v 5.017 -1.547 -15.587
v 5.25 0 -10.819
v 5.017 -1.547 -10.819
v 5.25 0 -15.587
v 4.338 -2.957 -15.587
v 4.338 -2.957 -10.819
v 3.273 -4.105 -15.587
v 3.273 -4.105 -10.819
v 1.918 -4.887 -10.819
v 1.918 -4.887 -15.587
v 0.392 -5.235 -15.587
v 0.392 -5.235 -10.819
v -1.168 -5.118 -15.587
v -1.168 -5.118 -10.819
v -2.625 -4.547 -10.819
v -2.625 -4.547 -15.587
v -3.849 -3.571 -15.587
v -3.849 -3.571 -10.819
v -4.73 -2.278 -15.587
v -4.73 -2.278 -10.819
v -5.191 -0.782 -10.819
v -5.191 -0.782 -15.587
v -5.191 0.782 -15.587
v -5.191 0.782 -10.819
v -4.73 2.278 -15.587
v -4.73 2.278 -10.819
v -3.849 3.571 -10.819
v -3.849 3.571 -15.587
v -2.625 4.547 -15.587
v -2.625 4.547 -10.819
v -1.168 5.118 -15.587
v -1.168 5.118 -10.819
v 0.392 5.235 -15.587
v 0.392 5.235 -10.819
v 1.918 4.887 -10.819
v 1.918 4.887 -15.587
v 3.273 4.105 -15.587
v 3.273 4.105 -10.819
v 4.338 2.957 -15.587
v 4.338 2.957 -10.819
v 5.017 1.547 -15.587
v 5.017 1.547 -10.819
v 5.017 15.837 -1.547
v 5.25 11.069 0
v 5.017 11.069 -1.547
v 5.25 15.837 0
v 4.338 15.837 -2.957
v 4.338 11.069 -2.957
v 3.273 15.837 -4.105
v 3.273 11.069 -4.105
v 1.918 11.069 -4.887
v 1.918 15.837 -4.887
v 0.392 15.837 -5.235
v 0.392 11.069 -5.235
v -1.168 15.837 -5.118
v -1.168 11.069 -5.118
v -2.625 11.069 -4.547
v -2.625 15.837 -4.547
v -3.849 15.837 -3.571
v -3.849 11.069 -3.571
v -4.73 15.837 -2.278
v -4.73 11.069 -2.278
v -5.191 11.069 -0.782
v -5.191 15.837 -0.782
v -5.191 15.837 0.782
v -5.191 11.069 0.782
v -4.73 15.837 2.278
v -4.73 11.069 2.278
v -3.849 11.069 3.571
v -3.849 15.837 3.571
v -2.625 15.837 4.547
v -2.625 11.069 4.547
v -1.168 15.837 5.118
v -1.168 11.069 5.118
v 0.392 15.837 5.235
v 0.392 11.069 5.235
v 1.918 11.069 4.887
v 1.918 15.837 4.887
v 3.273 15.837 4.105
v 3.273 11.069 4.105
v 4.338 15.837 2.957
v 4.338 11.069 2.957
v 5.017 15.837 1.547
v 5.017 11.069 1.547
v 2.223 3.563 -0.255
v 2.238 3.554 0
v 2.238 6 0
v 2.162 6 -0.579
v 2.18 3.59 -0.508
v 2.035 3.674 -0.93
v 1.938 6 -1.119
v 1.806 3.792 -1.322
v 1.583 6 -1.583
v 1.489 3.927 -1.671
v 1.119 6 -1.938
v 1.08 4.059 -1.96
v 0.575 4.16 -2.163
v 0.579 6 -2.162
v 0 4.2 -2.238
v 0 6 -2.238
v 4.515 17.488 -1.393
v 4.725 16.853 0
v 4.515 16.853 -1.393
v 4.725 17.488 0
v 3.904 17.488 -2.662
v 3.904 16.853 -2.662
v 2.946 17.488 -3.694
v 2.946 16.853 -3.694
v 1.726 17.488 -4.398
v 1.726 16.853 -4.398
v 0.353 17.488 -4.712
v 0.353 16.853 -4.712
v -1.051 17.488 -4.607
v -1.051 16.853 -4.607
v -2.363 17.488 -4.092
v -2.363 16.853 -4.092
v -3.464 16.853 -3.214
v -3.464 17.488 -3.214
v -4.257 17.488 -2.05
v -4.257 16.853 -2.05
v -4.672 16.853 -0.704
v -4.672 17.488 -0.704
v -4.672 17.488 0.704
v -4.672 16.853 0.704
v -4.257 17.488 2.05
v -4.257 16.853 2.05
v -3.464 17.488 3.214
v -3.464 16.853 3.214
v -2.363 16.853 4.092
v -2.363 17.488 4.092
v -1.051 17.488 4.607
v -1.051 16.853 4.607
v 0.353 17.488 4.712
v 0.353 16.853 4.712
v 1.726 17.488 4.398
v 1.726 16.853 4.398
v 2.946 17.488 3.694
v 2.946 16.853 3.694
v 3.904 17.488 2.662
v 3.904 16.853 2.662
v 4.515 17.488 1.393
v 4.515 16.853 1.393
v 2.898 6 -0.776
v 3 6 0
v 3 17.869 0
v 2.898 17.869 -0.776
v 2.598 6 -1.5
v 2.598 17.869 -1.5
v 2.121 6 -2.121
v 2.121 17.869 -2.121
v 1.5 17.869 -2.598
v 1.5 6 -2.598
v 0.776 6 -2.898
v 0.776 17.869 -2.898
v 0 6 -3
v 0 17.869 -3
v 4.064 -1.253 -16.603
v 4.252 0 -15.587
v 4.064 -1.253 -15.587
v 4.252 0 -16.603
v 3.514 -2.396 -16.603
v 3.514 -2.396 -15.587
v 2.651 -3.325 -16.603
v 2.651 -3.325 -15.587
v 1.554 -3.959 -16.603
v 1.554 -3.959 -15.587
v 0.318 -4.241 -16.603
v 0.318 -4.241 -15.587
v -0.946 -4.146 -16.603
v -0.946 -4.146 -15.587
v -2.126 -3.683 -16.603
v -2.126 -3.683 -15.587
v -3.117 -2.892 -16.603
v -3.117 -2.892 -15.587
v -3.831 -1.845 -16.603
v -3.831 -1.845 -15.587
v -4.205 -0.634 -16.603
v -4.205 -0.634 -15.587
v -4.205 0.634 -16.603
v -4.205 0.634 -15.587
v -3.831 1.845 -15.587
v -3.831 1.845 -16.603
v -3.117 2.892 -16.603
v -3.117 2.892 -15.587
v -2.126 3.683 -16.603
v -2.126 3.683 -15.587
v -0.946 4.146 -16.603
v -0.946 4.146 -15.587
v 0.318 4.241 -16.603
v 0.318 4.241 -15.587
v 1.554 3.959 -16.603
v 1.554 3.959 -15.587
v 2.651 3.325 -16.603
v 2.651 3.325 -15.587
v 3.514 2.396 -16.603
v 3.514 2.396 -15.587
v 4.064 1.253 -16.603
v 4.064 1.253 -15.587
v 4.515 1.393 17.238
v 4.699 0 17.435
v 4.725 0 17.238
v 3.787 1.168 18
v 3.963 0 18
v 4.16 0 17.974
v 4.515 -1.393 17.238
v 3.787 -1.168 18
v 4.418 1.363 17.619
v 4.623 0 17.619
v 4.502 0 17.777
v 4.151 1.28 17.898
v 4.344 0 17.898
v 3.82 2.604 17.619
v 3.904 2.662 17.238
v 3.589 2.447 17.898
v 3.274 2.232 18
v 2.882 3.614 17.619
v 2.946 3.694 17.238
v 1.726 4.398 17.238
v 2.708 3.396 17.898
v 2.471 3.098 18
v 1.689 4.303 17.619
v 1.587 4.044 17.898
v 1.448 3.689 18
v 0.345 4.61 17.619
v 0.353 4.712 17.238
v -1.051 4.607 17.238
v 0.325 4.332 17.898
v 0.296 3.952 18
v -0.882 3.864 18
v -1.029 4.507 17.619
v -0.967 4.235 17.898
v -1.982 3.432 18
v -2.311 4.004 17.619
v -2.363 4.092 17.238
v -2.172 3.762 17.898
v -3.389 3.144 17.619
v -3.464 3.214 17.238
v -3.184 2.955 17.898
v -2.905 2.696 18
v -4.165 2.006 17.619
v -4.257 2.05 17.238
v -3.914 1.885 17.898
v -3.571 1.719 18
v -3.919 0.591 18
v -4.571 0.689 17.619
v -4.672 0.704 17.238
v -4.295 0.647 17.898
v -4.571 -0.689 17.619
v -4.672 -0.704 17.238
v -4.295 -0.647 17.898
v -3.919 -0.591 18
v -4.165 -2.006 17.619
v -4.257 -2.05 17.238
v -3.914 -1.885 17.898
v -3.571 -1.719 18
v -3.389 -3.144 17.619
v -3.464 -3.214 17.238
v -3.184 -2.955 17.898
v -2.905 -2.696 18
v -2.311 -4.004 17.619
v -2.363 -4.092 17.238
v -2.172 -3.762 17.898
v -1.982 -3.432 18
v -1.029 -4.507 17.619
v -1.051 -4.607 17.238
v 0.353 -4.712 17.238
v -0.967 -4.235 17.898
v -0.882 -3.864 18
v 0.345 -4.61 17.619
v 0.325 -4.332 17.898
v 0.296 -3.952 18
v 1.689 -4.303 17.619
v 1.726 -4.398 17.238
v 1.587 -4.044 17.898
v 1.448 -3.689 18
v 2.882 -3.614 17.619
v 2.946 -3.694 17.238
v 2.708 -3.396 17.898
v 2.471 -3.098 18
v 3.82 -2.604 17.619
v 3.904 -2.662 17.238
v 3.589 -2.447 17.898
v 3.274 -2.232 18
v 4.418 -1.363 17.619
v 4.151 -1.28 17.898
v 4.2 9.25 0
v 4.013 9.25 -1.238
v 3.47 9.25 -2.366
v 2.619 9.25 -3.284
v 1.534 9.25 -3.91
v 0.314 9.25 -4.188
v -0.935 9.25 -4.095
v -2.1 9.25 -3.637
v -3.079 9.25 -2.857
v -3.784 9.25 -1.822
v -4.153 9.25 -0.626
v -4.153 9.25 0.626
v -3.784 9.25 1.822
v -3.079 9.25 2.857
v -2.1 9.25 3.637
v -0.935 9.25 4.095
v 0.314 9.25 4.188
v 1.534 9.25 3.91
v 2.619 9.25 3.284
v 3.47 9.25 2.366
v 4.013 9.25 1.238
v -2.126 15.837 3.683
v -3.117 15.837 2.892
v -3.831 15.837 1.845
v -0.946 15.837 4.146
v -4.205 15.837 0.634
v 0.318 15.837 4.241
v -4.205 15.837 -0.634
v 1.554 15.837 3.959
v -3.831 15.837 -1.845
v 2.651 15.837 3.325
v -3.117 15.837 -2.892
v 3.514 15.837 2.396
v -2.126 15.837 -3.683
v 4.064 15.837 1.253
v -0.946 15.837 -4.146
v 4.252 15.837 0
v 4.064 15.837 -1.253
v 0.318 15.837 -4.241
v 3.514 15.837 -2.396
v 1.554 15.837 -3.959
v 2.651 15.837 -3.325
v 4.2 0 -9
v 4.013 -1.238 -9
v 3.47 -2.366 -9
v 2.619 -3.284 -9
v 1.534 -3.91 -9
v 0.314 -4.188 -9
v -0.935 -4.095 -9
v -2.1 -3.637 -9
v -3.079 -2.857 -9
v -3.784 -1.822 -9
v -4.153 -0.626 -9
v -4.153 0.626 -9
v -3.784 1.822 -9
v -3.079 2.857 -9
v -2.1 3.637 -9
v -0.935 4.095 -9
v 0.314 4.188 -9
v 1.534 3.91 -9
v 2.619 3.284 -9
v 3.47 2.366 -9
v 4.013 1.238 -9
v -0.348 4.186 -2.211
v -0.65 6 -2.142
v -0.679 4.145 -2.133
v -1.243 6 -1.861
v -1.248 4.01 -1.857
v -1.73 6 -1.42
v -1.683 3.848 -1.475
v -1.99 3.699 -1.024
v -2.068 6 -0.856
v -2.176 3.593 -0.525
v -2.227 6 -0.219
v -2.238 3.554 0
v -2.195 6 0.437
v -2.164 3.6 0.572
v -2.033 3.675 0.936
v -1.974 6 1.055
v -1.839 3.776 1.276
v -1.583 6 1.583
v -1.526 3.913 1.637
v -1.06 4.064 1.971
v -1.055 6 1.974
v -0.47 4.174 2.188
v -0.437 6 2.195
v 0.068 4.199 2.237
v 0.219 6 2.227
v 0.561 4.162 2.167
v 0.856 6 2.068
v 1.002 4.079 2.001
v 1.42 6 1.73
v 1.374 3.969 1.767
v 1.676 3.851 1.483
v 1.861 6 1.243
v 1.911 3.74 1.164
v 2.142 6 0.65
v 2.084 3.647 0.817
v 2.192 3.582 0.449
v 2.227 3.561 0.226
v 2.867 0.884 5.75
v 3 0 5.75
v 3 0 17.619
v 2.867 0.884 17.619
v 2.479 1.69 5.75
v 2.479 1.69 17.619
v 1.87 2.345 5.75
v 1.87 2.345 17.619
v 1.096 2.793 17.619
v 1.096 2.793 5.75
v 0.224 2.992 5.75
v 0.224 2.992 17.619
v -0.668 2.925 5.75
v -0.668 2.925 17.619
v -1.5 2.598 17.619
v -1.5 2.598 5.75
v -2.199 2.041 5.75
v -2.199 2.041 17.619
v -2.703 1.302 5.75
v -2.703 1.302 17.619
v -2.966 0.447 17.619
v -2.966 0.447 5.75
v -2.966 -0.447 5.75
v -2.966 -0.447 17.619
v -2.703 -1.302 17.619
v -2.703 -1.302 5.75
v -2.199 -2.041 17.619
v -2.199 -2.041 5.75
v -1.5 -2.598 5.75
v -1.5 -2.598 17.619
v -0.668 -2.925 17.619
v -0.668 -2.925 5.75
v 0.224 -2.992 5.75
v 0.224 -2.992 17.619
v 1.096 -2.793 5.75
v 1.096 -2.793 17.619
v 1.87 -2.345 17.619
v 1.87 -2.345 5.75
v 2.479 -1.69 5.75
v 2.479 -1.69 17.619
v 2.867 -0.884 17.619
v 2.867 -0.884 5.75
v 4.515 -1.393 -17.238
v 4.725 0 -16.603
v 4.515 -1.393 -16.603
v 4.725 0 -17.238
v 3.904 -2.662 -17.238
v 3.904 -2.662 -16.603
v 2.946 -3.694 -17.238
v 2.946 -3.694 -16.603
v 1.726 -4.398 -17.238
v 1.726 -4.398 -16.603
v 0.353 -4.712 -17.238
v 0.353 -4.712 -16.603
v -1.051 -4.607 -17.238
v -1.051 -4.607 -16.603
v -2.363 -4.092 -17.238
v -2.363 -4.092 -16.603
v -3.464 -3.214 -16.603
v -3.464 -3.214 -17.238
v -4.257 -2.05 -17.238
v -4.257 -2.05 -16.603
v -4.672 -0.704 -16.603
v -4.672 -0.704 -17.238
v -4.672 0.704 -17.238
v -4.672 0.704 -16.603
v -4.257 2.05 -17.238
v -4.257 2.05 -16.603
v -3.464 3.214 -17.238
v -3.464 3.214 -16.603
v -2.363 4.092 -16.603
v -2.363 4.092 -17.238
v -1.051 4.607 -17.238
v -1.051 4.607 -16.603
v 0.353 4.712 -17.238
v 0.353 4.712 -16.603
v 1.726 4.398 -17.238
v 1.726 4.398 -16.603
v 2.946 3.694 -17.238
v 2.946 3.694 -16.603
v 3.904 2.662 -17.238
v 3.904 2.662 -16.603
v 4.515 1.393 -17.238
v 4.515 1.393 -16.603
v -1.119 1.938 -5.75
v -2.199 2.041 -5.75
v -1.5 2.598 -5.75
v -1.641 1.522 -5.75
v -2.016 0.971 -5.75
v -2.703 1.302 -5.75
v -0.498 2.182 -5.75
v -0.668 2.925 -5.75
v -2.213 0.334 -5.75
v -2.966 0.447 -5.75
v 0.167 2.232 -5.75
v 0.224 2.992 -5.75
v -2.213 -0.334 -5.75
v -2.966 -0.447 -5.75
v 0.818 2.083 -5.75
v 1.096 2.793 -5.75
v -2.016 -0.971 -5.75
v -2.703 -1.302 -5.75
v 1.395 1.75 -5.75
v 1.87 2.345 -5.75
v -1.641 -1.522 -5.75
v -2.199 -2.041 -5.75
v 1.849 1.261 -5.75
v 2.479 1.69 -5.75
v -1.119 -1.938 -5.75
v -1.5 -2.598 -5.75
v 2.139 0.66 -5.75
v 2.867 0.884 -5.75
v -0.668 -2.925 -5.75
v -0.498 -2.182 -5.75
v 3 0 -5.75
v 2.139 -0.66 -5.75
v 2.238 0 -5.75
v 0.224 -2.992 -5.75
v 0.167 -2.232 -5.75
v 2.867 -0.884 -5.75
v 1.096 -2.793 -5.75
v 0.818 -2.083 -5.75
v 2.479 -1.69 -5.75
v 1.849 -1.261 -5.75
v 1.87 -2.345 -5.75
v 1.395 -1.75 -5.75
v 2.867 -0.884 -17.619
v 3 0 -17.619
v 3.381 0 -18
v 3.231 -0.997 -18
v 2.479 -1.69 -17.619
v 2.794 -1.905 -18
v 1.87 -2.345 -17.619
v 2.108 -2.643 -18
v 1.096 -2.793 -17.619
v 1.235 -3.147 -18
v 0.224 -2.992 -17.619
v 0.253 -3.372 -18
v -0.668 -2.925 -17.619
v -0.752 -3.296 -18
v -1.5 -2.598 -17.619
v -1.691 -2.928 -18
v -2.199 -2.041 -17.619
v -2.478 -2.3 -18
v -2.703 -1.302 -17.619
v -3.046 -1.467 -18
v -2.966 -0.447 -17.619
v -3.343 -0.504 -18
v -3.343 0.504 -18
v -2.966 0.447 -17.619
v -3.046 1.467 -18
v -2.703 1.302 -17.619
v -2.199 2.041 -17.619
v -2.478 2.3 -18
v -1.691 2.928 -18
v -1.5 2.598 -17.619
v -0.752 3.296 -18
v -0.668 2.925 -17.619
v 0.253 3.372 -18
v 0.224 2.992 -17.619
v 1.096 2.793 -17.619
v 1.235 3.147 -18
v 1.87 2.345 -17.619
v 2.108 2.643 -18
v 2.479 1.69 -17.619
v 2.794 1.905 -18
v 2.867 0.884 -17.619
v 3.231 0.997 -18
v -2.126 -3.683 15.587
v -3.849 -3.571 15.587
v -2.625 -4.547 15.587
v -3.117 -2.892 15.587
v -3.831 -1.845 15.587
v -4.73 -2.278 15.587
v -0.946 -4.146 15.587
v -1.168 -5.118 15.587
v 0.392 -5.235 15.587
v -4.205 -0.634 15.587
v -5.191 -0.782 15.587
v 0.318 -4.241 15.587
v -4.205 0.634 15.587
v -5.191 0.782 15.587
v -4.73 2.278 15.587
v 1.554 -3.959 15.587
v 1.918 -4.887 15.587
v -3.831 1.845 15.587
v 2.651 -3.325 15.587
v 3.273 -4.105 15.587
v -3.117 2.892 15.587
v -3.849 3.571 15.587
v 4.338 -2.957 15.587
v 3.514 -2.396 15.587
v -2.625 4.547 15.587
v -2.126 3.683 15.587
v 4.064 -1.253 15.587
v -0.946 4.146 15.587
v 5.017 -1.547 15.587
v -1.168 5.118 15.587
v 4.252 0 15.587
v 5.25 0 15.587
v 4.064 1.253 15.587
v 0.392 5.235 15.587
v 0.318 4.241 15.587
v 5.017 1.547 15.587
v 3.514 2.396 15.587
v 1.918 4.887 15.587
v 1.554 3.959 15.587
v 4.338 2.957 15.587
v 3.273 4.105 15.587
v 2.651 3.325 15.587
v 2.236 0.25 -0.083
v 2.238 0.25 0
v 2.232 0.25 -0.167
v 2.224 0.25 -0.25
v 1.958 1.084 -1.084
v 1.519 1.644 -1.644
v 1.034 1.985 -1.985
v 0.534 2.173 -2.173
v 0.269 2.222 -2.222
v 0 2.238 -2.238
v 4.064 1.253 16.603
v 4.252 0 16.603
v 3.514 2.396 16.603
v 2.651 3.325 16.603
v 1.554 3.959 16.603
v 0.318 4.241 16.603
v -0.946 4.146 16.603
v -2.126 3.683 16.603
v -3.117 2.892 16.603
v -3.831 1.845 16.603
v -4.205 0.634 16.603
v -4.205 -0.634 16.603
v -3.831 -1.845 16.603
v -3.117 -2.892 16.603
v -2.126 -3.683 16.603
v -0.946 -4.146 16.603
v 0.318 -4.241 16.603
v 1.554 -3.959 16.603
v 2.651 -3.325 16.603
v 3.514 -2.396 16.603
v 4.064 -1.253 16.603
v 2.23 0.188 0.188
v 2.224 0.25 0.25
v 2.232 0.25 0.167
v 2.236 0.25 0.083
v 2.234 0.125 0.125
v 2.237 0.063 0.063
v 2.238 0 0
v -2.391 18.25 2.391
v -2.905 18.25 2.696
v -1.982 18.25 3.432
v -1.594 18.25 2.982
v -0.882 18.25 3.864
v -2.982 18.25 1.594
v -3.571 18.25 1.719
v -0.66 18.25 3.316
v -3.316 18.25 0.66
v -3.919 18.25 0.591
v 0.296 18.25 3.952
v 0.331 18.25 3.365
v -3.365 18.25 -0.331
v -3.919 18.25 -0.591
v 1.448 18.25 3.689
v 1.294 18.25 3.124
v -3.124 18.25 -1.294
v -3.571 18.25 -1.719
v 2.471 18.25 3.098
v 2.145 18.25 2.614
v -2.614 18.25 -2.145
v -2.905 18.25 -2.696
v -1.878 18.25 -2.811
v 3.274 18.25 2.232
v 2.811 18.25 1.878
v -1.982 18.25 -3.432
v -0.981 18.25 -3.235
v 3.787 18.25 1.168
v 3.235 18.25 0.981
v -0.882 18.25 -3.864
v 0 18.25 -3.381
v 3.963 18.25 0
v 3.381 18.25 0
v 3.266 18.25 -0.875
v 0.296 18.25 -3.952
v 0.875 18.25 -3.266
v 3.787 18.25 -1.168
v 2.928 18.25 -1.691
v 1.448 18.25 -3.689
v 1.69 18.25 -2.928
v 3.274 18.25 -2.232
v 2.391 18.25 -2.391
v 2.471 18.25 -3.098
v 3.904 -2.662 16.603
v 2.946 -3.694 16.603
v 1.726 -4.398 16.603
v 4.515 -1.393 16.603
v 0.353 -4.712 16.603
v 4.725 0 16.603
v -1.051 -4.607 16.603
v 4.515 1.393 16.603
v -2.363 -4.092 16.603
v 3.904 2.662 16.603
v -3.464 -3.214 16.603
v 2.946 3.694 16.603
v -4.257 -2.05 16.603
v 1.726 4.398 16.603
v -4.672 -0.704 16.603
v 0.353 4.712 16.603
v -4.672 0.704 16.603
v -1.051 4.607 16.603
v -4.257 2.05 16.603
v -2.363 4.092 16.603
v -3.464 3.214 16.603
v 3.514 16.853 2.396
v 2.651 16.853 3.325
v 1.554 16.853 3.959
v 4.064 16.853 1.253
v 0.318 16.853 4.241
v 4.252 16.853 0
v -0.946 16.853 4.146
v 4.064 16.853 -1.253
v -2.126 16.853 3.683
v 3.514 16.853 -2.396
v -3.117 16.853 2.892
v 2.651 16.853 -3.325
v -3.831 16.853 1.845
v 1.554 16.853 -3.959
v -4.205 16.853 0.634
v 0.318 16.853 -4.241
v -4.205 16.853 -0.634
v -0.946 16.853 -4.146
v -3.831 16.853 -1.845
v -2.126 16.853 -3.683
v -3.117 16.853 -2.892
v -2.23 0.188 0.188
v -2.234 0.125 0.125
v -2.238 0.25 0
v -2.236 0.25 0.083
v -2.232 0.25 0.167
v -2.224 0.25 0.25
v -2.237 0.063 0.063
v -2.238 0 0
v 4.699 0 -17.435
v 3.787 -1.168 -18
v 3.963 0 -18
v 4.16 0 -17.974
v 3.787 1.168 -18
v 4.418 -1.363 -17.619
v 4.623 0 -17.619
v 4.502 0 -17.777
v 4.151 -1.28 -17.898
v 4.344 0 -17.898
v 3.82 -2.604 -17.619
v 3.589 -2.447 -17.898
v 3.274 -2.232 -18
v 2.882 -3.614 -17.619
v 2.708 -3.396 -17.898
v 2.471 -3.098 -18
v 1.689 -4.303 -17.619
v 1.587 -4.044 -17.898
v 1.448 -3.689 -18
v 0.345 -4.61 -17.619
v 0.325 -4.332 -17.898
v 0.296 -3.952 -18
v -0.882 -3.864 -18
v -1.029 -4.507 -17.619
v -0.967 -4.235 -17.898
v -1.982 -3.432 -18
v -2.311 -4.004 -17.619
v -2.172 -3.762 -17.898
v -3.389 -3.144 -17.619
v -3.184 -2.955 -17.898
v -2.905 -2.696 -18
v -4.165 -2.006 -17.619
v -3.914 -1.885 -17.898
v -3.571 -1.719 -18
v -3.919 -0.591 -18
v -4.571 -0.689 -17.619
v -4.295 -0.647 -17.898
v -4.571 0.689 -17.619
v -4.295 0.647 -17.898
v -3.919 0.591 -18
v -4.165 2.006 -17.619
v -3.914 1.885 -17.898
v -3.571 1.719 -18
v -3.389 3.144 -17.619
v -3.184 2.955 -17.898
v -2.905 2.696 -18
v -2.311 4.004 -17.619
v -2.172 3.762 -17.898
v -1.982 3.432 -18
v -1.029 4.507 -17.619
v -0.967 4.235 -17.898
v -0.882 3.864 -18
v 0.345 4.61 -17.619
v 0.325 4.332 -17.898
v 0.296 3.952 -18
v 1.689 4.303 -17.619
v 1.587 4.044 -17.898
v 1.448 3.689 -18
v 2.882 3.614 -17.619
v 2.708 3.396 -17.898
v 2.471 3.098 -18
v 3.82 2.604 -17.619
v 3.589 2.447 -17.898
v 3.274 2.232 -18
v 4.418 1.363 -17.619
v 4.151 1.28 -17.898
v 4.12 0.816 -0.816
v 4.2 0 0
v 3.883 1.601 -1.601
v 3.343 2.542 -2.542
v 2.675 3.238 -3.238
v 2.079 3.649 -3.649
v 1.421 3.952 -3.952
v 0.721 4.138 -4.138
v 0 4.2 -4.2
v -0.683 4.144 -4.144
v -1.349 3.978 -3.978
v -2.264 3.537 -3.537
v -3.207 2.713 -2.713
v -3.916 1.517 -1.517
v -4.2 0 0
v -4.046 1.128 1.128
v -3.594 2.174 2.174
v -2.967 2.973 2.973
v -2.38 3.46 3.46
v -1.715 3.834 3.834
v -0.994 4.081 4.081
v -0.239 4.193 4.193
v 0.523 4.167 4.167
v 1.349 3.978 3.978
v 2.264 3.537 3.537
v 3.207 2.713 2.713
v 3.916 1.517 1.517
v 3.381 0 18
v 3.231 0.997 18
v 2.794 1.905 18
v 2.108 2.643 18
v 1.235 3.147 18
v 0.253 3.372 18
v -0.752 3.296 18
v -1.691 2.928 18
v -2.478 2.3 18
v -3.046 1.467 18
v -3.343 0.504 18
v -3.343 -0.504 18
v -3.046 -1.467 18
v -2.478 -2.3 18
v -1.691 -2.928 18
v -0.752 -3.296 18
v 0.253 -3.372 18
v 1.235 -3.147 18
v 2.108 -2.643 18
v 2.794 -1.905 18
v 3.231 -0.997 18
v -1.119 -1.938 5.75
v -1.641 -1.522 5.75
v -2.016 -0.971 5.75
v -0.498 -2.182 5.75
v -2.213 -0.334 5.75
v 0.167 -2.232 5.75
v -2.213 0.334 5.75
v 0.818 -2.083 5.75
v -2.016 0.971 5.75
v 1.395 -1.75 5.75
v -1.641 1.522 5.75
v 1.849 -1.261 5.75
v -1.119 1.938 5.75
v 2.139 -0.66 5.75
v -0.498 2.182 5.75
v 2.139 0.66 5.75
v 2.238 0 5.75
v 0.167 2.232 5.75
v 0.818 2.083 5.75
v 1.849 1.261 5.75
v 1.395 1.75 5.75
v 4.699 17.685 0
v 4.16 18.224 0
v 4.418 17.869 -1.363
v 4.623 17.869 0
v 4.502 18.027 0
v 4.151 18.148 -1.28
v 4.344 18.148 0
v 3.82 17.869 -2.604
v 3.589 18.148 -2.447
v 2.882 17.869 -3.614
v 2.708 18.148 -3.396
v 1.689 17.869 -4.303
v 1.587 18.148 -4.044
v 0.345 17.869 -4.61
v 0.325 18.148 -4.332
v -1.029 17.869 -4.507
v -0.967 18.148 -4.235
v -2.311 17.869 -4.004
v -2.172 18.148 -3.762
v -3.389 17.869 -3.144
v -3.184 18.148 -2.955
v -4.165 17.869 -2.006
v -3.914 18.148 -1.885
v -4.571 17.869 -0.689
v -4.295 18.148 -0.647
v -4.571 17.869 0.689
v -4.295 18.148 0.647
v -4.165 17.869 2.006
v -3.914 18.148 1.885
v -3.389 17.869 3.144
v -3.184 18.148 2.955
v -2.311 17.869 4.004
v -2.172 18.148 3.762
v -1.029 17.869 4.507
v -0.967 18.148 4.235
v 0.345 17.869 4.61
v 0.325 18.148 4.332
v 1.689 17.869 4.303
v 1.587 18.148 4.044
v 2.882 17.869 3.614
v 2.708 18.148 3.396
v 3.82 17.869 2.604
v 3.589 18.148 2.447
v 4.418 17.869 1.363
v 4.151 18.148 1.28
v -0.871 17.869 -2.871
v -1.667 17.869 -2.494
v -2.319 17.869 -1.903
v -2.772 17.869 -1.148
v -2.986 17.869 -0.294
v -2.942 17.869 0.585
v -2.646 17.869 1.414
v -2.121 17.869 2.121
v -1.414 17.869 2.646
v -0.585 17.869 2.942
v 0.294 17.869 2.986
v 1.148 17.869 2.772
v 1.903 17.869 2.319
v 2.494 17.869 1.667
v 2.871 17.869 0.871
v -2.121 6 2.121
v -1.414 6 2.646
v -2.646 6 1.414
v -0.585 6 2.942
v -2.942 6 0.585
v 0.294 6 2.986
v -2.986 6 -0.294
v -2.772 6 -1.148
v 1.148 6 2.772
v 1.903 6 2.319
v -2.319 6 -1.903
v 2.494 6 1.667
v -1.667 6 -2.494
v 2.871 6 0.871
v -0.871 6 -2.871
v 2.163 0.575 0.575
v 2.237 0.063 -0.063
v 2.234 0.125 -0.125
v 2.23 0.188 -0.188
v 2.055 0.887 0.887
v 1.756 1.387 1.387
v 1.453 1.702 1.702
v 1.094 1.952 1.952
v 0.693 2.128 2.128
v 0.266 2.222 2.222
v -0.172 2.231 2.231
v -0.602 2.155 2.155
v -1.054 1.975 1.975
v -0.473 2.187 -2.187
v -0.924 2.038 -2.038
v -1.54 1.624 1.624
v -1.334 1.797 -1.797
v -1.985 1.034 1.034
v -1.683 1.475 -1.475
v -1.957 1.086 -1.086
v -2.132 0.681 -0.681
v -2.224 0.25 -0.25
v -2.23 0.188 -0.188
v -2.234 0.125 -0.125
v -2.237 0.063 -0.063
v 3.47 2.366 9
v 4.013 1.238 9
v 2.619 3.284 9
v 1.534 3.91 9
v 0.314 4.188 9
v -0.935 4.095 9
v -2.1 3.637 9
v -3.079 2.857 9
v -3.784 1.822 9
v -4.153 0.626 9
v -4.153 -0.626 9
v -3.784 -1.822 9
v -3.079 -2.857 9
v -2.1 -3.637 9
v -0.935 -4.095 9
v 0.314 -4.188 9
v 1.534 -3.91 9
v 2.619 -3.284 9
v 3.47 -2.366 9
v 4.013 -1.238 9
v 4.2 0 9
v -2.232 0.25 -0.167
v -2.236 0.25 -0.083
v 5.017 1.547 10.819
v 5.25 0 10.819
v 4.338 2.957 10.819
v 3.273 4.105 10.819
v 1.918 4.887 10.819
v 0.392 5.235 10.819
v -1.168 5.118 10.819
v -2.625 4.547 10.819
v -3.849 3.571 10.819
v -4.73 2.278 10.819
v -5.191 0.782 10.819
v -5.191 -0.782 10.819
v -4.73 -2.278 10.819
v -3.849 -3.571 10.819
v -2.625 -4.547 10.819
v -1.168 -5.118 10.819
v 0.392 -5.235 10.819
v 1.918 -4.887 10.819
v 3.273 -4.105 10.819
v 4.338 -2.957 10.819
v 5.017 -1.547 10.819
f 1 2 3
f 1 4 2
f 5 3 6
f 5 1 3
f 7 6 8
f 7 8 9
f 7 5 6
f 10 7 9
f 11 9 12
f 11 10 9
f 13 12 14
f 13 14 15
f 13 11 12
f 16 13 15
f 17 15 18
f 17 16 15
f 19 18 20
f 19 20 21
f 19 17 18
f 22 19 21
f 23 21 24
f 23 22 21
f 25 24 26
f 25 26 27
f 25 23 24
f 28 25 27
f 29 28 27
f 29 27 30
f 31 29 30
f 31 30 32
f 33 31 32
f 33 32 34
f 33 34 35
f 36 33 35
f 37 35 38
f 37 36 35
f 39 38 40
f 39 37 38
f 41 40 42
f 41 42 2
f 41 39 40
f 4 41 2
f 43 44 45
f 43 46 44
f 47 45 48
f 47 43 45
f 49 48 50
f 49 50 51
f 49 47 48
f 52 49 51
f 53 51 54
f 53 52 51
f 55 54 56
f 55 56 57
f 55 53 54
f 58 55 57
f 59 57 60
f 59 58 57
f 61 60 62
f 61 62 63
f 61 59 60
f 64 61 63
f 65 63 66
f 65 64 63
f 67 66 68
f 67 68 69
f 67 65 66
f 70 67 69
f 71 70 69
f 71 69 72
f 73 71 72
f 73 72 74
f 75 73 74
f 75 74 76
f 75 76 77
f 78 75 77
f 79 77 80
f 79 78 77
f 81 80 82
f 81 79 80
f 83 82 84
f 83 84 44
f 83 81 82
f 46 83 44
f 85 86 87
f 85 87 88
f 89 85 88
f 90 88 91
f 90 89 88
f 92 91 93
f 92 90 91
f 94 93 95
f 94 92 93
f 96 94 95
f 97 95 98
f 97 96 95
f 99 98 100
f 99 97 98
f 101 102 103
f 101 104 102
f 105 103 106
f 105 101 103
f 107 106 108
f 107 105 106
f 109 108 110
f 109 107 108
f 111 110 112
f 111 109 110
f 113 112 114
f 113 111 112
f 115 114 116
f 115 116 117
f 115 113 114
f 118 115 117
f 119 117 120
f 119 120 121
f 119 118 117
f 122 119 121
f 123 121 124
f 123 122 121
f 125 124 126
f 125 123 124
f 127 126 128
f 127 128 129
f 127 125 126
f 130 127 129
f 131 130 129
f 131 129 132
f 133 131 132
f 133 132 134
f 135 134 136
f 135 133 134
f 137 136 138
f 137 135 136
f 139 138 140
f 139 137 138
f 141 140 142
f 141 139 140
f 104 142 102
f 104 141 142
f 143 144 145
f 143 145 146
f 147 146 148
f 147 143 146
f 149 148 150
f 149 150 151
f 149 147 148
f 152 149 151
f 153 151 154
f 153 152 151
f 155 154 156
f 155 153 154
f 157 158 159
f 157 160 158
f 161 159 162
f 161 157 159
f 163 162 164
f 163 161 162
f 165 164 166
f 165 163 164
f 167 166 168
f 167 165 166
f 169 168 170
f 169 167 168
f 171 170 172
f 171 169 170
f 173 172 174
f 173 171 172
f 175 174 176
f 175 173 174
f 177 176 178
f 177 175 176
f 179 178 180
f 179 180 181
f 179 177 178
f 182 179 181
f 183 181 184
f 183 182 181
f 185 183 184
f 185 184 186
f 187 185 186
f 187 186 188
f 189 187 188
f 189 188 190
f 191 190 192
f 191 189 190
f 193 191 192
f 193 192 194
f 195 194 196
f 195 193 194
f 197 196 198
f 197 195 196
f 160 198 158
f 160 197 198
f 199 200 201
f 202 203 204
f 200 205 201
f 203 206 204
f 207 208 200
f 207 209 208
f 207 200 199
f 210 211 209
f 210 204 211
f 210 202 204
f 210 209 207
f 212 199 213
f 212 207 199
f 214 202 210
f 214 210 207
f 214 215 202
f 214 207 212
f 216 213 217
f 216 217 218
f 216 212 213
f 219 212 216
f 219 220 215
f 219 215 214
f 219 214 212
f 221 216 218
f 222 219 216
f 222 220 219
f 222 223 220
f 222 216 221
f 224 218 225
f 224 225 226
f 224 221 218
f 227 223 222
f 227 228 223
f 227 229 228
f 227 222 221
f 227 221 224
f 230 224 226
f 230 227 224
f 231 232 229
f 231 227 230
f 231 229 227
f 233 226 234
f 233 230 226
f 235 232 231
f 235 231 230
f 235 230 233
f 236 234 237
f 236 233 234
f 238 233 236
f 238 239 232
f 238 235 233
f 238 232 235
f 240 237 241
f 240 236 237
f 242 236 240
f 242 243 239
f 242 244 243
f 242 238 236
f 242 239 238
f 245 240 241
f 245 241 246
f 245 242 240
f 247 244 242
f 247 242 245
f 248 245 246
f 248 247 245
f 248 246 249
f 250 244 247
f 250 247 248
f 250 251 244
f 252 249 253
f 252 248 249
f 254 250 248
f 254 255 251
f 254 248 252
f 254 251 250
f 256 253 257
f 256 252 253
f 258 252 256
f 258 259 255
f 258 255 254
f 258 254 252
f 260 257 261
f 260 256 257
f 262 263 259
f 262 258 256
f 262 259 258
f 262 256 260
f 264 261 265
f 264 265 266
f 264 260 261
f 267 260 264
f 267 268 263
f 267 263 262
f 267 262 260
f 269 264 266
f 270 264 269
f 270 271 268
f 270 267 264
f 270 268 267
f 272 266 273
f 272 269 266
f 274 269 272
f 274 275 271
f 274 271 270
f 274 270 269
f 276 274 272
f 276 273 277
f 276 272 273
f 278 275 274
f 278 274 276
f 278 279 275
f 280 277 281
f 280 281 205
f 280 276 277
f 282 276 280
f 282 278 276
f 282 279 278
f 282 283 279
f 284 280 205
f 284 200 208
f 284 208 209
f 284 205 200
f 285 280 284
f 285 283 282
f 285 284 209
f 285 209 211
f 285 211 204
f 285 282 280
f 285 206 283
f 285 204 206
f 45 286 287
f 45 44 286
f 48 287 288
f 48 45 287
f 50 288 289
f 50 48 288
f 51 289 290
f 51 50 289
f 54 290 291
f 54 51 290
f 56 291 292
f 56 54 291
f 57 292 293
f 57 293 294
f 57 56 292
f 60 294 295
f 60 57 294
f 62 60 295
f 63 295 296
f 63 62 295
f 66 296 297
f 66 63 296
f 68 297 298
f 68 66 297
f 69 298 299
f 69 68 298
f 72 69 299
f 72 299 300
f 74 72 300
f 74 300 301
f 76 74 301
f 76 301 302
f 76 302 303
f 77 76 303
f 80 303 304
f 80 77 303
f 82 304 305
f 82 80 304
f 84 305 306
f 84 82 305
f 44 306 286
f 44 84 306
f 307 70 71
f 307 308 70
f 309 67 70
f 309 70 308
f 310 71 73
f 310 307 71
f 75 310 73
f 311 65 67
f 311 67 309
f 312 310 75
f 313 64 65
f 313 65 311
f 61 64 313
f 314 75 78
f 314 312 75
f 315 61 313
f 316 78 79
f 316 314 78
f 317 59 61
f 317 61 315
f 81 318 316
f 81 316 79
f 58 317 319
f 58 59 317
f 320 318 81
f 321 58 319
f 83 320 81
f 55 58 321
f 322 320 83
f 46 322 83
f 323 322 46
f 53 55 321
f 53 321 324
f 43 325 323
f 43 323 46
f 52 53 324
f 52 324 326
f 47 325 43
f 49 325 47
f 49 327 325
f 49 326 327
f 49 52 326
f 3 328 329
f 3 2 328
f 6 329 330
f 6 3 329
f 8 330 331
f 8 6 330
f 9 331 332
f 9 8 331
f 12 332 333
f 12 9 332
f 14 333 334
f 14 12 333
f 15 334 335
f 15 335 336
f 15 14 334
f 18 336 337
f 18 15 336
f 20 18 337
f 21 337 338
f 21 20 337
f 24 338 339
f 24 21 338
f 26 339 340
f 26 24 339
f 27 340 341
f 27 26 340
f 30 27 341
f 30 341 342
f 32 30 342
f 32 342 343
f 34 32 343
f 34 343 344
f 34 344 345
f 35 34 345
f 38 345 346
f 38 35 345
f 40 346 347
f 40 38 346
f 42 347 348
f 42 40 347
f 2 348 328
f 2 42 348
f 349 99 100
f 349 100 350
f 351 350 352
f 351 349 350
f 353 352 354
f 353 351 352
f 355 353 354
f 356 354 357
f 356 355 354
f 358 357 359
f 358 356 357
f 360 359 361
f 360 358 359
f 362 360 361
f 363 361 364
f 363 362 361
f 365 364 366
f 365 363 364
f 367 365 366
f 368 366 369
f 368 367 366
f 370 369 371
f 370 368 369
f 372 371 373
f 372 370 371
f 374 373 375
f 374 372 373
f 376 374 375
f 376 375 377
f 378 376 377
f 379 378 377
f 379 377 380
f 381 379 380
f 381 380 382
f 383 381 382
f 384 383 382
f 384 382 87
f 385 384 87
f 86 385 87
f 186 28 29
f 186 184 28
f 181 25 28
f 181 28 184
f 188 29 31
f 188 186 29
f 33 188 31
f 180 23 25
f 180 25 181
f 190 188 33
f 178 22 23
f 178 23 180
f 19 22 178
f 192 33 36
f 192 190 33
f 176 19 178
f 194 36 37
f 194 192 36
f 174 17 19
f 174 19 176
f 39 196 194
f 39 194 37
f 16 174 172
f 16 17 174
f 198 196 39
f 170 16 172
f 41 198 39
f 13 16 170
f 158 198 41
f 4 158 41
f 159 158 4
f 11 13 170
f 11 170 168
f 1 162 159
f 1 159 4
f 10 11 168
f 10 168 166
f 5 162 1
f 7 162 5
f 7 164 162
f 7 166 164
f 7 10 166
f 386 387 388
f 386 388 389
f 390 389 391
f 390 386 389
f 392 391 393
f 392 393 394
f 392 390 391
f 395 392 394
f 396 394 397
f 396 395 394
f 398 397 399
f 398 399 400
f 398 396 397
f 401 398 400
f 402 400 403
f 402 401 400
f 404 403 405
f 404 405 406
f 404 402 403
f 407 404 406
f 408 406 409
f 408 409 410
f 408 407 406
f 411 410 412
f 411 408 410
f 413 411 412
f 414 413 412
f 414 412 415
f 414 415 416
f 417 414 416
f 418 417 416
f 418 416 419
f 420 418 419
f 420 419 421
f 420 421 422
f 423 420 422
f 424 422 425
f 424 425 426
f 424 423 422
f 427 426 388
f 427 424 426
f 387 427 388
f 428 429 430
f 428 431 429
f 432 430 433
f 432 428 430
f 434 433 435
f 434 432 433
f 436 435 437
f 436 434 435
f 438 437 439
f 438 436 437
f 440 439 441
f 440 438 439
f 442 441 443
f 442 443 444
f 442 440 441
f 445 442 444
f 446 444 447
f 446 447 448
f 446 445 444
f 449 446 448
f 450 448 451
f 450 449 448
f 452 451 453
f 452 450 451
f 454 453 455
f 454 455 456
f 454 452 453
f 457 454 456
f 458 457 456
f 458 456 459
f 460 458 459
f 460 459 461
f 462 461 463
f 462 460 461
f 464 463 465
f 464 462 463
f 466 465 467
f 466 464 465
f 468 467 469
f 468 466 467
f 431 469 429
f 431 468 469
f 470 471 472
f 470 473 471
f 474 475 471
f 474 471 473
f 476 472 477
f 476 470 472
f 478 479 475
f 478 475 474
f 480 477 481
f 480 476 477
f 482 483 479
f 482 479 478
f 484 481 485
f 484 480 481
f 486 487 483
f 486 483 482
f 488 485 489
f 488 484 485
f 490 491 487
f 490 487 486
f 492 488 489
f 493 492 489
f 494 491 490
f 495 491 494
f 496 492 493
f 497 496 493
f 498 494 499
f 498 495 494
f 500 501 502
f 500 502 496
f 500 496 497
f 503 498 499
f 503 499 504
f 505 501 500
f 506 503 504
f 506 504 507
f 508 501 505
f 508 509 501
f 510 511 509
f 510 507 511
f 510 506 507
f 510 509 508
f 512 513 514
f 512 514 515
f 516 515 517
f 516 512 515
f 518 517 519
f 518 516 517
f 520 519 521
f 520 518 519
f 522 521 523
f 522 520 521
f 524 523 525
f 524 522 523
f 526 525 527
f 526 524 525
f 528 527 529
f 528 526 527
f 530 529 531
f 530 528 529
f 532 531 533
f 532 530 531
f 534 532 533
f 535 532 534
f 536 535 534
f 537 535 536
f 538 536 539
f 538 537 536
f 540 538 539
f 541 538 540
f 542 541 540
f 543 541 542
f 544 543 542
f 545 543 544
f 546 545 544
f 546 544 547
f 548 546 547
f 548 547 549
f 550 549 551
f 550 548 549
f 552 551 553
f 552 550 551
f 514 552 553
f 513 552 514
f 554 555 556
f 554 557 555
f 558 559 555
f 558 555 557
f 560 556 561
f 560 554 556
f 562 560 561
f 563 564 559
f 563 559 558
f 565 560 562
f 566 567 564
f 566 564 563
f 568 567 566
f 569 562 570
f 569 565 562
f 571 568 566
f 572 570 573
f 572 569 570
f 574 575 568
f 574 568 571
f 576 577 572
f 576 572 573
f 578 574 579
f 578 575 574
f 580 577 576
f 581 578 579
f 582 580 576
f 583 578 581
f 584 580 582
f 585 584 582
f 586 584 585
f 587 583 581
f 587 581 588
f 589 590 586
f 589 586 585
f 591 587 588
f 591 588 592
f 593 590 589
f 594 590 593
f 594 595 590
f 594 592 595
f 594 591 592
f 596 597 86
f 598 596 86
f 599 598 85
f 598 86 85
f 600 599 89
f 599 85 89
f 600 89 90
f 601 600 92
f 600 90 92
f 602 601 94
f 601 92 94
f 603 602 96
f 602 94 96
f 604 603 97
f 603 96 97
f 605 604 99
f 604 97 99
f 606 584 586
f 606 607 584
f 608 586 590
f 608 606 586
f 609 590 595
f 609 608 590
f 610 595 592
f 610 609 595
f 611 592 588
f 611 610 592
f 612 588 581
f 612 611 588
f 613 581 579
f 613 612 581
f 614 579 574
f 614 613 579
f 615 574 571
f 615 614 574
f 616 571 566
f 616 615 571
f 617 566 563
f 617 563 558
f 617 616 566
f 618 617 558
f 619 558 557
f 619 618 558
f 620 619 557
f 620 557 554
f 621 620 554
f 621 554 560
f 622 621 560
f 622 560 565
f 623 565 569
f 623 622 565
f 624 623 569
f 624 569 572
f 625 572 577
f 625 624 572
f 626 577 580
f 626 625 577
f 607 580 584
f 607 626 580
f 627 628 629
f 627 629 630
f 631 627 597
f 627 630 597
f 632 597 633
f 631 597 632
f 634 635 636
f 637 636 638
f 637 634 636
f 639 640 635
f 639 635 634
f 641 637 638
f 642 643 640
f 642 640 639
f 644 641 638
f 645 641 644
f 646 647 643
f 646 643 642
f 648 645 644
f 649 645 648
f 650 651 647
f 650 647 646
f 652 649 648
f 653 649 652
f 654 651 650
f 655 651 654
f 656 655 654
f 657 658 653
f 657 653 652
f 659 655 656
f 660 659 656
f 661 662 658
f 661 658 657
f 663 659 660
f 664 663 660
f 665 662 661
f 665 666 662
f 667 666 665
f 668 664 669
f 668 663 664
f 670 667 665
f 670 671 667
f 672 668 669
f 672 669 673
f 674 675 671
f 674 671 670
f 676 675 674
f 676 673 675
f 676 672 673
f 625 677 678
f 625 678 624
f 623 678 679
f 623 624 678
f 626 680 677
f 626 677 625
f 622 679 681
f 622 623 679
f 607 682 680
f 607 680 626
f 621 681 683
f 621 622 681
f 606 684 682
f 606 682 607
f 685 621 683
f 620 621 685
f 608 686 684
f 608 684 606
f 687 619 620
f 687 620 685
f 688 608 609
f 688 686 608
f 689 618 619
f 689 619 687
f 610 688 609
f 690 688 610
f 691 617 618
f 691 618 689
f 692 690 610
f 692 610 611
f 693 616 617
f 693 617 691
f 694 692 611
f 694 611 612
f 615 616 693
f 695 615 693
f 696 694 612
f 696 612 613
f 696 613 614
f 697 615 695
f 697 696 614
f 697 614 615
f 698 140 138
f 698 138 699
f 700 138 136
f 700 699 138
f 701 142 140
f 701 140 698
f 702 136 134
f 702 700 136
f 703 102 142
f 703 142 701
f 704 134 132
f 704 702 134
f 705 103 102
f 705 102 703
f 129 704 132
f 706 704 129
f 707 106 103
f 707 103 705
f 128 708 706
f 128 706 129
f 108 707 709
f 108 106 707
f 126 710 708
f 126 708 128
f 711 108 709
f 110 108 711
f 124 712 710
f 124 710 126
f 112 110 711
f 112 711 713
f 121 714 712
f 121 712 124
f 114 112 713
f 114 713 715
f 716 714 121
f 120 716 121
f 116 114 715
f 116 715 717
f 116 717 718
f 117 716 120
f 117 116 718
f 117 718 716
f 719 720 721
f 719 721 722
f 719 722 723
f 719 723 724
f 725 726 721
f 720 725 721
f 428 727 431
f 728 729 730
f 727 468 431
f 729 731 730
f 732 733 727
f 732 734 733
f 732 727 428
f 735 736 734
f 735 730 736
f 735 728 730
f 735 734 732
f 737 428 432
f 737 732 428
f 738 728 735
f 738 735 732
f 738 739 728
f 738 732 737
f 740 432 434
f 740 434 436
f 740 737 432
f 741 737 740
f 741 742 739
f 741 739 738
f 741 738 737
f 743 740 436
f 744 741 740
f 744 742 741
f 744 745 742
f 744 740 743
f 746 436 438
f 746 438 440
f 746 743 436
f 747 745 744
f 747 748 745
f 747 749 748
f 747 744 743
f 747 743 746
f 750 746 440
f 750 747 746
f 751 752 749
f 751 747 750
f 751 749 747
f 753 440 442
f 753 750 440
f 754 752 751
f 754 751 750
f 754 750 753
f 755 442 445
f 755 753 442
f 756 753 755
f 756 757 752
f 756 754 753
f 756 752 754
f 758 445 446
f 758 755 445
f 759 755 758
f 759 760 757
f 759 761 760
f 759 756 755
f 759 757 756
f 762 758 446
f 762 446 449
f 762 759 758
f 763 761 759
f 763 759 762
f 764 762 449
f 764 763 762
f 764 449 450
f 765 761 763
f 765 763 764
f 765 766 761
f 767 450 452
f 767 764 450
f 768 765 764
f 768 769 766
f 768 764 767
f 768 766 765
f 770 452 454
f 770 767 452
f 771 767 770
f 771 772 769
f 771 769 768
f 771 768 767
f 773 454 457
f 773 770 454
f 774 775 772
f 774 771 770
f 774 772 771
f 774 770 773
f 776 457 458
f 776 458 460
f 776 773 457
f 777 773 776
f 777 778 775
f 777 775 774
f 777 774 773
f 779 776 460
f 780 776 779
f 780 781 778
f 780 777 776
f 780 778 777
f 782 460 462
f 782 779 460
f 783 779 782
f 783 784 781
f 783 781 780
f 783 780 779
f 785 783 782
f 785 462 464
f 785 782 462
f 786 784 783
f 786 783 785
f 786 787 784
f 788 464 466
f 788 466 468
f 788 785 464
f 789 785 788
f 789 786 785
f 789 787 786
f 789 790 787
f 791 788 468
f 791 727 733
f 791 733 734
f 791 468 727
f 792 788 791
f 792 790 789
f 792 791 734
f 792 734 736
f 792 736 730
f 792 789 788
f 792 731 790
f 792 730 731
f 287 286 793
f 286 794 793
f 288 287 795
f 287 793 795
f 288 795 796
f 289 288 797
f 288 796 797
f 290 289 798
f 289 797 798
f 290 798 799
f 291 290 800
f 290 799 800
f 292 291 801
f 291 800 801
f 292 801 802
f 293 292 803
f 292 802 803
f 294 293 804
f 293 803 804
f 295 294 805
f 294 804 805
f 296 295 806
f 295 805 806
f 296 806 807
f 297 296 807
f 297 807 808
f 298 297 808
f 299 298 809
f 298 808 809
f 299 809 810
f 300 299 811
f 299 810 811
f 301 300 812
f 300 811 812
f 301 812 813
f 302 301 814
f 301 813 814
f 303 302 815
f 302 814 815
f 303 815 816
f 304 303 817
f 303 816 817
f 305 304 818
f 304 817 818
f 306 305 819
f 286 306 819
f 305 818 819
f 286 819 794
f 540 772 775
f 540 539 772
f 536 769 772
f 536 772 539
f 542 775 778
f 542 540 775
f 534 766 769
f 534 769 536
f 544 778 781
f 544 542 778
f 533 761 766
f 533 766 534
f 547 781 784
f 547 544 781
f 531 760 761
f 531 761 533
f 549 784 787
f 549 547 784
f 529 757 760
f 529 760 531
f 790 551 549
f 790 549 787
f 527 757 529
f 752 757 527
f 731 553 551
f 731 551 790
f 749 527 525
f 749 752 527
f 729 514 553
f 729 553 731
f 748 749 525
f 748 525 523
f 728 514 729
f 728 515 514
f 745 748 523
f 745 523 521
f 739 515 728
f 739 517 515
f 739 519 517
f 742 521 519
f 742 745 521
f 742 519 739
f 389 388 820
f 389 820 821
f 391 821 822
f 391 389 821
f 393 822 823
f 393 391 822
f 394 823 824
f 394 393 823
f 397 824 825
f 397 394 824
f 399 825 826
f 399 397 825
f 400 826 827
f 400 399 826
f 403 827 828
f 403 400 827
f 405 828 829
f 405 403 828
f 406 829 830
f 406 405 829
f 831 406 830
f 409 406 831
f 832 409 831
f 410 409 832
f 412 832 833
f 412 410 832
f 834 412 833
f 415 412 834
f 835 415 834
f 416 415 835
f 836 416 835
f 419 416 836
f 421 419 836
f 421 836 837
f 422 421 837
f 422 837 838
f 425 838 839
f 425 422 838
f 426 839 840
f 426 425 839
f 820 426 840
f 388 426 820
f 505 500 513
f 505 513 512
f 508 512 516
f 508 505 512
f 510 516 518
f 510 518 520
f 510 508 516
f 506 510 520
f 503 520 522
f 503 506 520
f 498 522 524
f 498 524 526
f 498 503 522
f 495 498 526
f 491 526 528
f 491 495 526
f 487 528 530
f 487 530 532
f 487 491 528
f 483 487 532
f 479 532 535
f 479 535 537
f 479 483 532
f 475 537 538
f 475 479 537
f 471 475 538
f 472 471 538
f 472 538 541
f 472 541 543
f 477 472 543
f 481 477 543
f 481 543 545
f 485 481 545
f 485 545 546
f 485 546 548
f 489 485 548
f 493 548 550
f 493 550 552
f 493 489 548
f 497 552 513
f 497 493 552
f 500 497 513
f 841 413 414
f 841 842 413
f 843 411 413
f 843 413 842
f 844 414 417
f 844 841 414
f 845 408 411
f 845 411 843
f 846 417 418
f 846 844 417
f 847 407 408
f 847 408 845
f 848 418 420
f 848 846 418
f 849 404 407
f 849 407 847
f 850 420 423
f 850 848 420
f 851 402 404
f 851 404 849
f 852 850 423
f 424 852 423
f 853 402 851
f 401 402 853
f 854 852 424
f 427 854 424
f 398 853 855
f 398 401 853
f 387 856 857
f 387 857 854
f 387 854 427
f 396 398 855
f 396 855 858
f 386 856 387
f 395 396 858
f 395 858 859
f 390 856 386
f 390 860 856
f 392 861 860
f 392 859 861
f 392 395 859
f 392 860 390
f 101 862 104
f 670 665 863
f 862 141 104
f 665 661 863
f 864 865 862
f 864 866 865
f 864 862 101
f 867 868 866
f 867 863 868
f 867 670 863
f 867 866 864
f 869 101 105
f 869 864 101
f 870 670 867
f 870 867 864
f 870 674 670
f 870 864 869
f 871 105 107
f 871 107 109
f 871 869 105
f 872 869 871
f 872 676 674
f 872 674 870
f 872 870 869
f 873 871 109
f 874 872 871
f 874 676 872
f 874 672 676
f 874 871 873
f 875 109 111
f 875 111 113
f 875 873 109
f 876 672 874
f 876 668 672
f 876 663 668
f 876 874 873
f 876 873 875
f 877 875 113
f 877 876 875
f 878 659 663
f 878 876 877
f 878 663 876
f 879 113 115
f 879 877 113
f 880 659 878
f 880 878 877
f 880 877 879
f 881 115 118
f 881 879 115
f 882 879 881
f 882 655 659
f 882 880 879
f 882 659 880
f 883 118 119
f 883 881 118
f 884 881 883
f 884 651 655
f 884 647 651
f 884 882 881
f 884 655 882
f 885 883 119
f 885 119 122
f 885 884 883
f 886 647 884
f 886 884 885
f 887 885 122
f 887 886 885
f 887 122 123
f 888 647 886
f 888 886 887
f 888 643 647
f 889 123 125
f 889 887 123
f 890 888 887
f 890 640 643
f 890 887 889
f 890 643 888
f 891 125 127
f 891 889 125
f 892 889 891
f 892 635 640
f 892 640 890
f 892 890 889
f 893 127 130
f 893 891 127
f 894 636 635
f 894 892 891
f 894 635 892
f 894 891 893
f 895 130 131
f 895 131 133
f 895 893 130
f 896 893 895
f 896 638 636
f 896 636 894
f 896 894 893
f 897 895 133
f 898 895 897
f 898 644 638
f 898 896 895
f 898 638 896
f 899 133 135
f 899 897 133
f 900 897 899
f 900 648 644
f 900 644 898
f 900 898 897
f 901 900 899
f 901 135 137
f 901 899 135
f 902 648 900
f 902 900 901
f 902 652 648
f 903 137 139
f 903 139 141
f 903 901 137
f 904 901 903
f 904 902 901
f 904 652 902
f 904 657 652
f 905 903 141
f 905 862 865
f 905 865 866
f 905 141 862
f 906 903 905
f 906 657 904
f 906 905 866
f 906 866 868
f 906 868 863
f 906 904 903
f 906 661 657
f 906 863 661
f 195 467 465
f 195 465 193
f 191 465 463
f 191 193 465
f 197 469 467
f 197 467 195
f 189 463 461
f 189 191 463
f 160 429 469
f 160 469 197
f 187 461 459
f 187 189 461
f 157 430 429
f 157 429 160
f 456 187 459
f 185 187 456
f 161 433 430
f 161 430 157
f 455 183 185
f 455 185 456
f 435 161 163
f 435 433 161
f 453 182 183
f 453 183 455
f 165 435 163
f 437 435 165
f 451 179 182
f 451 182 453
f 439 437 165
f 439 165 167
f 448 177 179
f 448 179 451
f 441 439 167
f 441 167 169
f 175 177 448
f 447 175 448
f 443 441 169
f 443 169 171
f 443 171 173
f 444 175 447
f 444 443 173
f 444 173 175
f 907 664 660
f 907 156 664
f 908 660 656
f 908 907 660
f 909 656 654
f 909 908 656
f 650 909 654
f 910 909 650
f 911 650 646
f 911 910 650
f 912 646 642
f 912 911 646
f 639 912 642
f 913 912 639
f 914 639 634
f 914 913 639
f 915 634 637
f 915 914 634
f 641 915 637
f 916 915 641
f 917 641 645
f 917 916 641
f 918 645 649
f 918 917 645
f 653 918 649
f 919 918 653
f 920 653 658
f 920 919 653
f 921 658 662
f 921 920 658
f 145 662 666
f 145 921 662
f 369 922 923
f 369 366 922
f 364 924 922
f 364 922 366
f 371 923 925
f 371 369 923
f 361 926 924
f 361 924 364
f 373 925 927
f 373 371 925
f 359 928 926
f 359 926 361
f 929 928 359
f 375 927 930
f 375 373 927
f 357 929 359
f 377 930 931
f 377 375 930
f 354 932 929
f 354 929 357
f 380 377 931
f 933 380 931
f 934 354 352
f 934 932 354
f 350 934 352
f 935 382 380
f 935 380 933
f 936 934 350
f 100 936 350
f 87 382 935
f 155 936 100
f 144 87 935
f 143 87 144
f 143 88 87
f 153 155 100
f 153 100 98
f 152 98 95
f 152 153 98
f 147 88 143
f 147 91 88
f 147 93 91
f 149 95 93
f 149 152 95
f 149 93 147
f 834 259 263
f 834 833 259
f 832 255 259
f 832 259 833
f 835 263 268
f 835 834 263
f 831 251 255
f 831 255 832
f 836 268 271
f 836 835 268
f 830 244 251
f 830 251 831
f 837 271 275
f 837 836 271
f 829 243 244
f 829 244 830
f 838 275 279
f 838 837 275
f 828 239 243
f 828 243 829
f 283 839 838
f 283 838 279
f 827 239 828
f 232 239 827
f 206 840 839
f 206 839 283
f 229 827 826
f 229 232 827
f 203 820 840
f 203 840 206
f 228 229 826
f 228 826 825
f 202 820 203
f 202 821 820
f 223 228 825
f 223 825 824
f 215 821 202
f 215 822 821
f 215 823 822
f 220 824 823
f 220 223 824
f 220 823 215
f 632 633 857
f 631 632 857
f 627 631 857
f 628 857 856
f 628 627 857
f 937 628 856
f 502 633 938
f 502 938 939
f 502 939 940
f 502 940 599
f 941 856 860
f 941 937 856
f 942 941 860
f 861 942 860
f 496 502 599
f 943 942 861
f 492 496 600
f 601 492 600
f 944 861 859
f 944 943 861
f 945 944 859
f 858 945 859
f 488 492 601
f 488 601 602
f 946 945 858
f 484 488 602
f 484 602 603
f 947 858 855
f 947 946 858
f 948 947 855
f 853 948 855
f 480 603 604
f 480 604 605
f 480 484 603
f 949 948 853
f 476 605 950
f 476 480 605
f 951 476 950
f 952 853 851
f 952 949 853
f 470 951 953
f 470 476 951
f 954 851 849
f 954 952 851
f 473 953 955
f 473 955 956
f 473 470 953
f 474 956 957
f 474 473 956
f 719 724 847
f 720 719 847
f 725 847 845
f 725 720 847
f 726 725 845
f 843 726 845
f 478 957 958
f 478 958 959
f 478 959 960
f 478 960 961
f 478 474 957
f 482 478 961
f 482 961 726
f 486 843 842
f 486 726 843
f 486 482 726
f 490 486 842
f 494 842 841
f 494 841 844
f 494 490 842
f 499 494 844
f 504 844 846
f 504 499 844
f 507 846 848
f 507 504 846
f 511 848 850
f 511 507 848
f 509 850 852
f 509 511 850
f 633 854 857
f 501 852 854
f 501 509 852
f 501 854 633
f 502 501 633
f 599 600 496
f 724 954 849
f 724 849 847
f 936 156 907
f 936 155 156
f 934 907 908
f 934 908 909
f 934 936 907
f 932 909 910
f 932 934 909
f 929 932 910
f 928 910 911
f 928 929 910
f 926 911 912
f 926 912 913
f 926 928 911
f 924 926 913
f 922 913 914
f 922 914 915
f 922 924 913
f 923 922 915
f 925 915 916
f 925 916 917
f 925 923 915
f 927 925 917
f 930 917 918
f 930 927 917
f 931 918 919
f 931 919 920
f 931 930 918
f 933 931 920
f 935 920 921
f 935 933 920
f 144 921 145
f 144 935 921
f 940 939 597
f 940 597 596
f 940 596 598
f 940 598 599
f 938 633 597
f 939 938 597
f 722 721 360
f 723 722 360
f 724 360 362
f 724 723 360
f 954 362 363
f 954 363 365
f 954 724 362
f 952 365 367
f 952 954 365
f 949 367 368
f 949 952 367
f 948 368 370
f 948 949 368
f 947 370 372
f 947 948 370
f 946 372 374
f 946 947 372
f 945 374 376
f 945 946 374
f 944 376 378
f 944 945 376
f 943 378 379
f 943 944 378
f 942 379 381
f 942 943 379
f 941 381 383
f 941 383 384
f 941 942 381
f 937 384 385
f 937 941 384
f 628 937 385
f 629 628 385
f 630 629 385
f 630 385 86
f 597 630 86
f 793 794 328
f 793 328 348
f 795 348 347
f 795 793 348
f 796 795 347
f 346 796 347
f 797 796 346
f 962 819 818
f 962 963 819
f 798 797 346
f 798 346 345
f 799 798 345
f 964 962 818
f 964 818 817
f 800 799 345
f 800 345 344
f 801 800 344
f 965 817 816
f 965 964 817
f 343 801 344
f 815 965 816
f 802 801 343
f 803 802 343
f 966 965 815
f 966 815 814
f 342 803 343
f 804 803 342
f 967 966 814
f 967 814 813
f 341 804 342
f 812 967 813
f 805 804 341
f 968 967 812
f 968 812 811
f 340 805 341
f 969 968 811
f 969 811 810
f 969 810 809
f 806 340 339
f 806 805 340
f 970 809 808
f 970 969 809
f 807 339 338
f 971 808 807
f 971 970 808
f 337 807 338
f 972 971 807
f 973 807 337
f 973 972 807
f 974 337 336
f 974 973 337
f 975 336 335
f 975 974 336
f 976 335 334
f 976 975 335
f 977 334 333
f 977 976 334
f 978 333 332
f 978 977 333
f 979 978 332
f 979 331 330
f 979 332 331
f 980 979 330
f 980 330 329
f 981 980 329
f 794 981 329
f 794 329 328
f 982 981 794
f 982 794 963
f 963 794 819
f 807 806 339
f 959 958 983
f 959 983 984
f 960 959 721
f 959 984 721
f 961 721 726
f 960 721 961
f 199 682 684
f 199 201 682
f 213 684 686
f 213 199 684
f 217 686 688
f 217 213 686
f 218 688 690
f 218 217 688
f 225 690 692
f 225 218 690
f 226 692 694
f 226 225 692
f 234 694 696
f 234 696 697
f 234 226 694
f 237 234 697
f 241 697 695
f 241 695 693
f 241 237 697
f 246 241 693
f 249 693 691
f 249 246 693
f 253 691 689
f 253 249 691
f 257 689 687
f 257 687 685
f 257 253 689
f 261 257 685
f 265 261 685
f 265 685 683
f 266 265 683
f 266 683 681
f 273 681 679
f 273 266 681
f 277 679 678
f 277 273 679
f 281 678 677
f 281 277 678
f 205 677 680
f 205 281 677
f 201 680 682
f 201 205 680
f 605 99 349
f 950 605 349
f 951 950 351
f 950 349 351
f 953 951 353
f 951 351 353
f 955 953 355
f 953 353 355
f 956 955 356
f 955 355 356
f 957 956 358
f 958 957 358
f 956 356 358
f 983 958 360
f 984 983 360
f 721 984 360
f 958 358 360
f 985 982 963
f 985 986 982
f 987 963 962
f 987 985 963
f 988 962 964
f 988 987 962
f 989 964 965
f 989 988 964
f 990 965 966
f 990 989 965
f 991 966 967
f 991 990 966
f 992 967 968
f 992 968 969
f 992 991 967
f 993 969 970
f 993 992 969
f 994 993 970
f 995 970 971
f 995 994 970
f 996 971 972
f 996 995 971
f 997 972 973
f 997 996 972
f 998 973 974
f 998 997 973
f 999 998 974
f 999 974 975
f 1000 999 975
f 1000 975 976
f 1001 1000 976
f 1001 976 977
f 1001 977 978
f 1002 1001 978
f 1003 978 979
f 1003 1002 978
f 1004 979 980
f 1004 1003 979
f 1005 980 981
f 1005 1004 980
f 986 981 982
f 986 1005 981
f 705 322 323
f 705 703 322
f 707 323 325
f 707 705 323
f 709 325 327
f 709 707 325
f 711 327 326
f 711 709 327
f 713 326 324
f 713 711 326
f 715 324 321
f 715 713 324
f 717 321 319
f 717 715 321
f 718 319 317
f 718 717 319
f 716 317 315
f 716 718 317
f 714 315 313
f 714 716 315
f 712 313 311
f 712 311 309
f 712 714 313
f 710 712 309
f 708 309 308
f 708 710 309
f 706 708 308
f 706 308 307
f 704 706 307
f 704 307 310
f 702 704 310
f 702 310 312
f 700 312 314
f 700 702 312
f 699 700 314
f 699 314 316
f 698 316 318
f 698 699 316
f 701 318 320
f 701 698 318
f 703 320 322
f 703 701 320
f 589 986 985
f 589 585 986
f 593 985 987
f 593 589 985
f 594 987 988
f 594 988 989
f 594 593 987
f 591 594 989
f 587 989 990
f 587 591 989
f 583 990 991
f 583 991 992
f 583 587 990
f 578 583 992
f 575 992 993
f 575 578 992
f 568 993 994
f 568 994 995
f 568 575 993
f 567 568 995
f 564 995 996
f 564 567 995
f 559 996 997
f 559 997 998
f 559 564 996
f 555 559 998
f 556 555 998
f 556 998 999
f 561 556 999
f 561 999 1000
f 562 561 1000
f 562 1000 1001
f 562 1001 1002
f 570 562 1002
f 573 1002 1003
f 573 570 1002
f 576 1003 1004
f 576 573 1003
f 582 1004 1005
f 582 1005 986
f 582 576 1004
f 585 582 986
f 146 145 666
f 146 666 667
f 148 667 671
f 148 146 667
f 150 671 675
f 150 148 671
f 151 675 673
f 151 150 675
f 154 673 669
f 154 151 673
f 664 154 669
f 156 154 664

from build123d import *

# Parameters (mm, degrees)
CIRPATTERN1_COUNT   = 3
CIRPATTERN1_ANGLE   = 180
SKETCH3_R           = 4.2
BOSS_EXTRUDE1_DEPTH = 0.25
CIRPATTERN2_COUNT   = 2
CIRPATTERN2_ANGLE   = 180


with BuildPart() as part:
    # Sketch1 → Revolve1 (revolve)
    with BuildSketch(Plane(origin=(0, 0, 0), x_dir=(0, 0, -1), z_dir=(1, 0, 0)), mode=Mode.PRIVATE) as revolve1_sk:
        with BuildLine():
            Line((16.603, 4.725), (17.238, 4.725))
            ThreePointArc((17.238, 4.725), (17.776815367, 4.501815367), (18, 3.963))
            Line((18, 3.963), (18, 3.381))
            Line((18, 3.381), (17.619, 3))
            Line((17.619, 3), (5.75, 3))
            Line((5.75, 3), (5.75, 2.238))
            Line((5.75, 2.238), (0, 2.238))
            Line((0, 2.238), (0, 4.2))
            Line((0, 4.2), (9, 4.2))
            Line((9, 4.2), (10.818653348, 5.25))
            Line((10.818653348, 5.25), (15.587, 5.25))
            Line((15.587, 5.25), (15.587, 4.2525))
            Line((15.587, 4.2525), (16.603, 4.2525))
            Line((16.603, 4.2525), (16.603, 4.725))
        make_face()
    revolve(revolve1_sk.sketch.rotate(Axis((0, 0, 0), (0, 0, -1)), 90), axis=Axis((0, 0, 0), (0, 0, -1)))


with BuildPart() as cirpattern1_1:
    # CirPattern1: pattern copy
    add(part.part.rotate(Axis((0, 0, 0), (1, 0, 0)), 1 * CIRPATTERN1_ANGLE / (CIRPATTERN1_COUNT - 1)))


with BuildPart() as cirpattern1_2:
    # CirPattern1: pattern copy
    add(part.part.rotate(Axis((0, 0, 0), (1, 0, 0)), 2 * CIRPATTERN1_ANGLE / (CIRPATTERN1_COUNT - 1)))


with BuildPart() as cirpattern1_1_1:
    # Body-Move/Copy1: moved
    add(cirpattern1_1.part.moved(Location((0, 0.25, 0))))

    # Sketch3 → Boss-Extrude1 (add)
    with BuildSketch(Plane(origin=(0, 0, 0), x_dir=(1, 0, 0), z_dir=(0, 1, 0))):
        Circle(SKETCH3_R)
    extrude(amount=BOSS_EXTRUDE1_DEPTH)


with BuildPart() as cut_revolve2_tool:
    # Sketch4 → Cut-Revolve2 (revolve)
    with BuildSketch(Plane(origin=(0, 0, 0), x_dir=(0, 0, -1), z_dir=(1, 0, 0))):
        Polygon((3, 17.869), (3.381, 18.25), (0, 18.25), (0, 0), (2.238, 0), (2.238, 6), (3, 6), align=None)
    revolve(axis=Axis((0, 0, 0), (0, 1, 0)))


with BuildPart() as part_1:
    add(part.part)

    # Cut-Revolve2: cut by cut_revolve2_tool
    add(cut_revolve2_tool.part, mode=Mode.SUBTRACT)


with BuildPart() as cirpattern1_1_2:
    add(cirpattern1_1_1.part)

    # Cut-Revolve2: cut by cut_revolve2_tool
    add(cut_revolve2_tool.part, mode=Mode.SUBTRACT)


with BuildPart() as cirpattern1_2_1:
    add(cirpattern1_2.part)

    # Cut-Revolve2: cut by cut_revolve2_tool
    add(cut_revolve2_tool.part, mode=Mode.SUBTRACT)


with BuildPart() as part_2:
    add(part_1.part)

    # Combine1: union CirPattern1_1, CirPattern1_2
    add(cirpattern1_1_2.part)
    add(cirpattern1_2_1.part)

    # Sketch5 → Cut-Revolve1 (revolve, cut)
    with BuildSketch(Plane(origin=(0, 0, 0), x_dir=(0, 0, -1), z_dir=(1, 0, 0)), mode=Mode.PRIVATE) as cut_revolve1_sk:
        Polygon((18, 3.381), (17.619, 3), (5.75, 3), (5.75, 2.238), (0, 2.238), (0, 0), (18, 0), align=None)
    cut_revolve1 = revolve(cut_revolve1_sk.sketch.rotate(Axis((0, 0, 0), (0, 0, -1)), 90), axis=Axis((0, 0, 0), (0, 0, -1)), mode=Mode.SUBTRACT)

    # CirPattern2: Cut-Revolve1 ×2 about axis
    cirpattern2_axis = Axis((-5.775, 0, 0), (1, 0, 0))
    for i in range(1, CIRPATTERN2_COUNT):
        add(cut_revolve1.rotate(cirpattern2_axis, i * CIRPATTERN2_ANGLE / (CIRPATTERN2_COUNT - 1)), mode=Mode.SUBTRACT)


solid = part_2.part
